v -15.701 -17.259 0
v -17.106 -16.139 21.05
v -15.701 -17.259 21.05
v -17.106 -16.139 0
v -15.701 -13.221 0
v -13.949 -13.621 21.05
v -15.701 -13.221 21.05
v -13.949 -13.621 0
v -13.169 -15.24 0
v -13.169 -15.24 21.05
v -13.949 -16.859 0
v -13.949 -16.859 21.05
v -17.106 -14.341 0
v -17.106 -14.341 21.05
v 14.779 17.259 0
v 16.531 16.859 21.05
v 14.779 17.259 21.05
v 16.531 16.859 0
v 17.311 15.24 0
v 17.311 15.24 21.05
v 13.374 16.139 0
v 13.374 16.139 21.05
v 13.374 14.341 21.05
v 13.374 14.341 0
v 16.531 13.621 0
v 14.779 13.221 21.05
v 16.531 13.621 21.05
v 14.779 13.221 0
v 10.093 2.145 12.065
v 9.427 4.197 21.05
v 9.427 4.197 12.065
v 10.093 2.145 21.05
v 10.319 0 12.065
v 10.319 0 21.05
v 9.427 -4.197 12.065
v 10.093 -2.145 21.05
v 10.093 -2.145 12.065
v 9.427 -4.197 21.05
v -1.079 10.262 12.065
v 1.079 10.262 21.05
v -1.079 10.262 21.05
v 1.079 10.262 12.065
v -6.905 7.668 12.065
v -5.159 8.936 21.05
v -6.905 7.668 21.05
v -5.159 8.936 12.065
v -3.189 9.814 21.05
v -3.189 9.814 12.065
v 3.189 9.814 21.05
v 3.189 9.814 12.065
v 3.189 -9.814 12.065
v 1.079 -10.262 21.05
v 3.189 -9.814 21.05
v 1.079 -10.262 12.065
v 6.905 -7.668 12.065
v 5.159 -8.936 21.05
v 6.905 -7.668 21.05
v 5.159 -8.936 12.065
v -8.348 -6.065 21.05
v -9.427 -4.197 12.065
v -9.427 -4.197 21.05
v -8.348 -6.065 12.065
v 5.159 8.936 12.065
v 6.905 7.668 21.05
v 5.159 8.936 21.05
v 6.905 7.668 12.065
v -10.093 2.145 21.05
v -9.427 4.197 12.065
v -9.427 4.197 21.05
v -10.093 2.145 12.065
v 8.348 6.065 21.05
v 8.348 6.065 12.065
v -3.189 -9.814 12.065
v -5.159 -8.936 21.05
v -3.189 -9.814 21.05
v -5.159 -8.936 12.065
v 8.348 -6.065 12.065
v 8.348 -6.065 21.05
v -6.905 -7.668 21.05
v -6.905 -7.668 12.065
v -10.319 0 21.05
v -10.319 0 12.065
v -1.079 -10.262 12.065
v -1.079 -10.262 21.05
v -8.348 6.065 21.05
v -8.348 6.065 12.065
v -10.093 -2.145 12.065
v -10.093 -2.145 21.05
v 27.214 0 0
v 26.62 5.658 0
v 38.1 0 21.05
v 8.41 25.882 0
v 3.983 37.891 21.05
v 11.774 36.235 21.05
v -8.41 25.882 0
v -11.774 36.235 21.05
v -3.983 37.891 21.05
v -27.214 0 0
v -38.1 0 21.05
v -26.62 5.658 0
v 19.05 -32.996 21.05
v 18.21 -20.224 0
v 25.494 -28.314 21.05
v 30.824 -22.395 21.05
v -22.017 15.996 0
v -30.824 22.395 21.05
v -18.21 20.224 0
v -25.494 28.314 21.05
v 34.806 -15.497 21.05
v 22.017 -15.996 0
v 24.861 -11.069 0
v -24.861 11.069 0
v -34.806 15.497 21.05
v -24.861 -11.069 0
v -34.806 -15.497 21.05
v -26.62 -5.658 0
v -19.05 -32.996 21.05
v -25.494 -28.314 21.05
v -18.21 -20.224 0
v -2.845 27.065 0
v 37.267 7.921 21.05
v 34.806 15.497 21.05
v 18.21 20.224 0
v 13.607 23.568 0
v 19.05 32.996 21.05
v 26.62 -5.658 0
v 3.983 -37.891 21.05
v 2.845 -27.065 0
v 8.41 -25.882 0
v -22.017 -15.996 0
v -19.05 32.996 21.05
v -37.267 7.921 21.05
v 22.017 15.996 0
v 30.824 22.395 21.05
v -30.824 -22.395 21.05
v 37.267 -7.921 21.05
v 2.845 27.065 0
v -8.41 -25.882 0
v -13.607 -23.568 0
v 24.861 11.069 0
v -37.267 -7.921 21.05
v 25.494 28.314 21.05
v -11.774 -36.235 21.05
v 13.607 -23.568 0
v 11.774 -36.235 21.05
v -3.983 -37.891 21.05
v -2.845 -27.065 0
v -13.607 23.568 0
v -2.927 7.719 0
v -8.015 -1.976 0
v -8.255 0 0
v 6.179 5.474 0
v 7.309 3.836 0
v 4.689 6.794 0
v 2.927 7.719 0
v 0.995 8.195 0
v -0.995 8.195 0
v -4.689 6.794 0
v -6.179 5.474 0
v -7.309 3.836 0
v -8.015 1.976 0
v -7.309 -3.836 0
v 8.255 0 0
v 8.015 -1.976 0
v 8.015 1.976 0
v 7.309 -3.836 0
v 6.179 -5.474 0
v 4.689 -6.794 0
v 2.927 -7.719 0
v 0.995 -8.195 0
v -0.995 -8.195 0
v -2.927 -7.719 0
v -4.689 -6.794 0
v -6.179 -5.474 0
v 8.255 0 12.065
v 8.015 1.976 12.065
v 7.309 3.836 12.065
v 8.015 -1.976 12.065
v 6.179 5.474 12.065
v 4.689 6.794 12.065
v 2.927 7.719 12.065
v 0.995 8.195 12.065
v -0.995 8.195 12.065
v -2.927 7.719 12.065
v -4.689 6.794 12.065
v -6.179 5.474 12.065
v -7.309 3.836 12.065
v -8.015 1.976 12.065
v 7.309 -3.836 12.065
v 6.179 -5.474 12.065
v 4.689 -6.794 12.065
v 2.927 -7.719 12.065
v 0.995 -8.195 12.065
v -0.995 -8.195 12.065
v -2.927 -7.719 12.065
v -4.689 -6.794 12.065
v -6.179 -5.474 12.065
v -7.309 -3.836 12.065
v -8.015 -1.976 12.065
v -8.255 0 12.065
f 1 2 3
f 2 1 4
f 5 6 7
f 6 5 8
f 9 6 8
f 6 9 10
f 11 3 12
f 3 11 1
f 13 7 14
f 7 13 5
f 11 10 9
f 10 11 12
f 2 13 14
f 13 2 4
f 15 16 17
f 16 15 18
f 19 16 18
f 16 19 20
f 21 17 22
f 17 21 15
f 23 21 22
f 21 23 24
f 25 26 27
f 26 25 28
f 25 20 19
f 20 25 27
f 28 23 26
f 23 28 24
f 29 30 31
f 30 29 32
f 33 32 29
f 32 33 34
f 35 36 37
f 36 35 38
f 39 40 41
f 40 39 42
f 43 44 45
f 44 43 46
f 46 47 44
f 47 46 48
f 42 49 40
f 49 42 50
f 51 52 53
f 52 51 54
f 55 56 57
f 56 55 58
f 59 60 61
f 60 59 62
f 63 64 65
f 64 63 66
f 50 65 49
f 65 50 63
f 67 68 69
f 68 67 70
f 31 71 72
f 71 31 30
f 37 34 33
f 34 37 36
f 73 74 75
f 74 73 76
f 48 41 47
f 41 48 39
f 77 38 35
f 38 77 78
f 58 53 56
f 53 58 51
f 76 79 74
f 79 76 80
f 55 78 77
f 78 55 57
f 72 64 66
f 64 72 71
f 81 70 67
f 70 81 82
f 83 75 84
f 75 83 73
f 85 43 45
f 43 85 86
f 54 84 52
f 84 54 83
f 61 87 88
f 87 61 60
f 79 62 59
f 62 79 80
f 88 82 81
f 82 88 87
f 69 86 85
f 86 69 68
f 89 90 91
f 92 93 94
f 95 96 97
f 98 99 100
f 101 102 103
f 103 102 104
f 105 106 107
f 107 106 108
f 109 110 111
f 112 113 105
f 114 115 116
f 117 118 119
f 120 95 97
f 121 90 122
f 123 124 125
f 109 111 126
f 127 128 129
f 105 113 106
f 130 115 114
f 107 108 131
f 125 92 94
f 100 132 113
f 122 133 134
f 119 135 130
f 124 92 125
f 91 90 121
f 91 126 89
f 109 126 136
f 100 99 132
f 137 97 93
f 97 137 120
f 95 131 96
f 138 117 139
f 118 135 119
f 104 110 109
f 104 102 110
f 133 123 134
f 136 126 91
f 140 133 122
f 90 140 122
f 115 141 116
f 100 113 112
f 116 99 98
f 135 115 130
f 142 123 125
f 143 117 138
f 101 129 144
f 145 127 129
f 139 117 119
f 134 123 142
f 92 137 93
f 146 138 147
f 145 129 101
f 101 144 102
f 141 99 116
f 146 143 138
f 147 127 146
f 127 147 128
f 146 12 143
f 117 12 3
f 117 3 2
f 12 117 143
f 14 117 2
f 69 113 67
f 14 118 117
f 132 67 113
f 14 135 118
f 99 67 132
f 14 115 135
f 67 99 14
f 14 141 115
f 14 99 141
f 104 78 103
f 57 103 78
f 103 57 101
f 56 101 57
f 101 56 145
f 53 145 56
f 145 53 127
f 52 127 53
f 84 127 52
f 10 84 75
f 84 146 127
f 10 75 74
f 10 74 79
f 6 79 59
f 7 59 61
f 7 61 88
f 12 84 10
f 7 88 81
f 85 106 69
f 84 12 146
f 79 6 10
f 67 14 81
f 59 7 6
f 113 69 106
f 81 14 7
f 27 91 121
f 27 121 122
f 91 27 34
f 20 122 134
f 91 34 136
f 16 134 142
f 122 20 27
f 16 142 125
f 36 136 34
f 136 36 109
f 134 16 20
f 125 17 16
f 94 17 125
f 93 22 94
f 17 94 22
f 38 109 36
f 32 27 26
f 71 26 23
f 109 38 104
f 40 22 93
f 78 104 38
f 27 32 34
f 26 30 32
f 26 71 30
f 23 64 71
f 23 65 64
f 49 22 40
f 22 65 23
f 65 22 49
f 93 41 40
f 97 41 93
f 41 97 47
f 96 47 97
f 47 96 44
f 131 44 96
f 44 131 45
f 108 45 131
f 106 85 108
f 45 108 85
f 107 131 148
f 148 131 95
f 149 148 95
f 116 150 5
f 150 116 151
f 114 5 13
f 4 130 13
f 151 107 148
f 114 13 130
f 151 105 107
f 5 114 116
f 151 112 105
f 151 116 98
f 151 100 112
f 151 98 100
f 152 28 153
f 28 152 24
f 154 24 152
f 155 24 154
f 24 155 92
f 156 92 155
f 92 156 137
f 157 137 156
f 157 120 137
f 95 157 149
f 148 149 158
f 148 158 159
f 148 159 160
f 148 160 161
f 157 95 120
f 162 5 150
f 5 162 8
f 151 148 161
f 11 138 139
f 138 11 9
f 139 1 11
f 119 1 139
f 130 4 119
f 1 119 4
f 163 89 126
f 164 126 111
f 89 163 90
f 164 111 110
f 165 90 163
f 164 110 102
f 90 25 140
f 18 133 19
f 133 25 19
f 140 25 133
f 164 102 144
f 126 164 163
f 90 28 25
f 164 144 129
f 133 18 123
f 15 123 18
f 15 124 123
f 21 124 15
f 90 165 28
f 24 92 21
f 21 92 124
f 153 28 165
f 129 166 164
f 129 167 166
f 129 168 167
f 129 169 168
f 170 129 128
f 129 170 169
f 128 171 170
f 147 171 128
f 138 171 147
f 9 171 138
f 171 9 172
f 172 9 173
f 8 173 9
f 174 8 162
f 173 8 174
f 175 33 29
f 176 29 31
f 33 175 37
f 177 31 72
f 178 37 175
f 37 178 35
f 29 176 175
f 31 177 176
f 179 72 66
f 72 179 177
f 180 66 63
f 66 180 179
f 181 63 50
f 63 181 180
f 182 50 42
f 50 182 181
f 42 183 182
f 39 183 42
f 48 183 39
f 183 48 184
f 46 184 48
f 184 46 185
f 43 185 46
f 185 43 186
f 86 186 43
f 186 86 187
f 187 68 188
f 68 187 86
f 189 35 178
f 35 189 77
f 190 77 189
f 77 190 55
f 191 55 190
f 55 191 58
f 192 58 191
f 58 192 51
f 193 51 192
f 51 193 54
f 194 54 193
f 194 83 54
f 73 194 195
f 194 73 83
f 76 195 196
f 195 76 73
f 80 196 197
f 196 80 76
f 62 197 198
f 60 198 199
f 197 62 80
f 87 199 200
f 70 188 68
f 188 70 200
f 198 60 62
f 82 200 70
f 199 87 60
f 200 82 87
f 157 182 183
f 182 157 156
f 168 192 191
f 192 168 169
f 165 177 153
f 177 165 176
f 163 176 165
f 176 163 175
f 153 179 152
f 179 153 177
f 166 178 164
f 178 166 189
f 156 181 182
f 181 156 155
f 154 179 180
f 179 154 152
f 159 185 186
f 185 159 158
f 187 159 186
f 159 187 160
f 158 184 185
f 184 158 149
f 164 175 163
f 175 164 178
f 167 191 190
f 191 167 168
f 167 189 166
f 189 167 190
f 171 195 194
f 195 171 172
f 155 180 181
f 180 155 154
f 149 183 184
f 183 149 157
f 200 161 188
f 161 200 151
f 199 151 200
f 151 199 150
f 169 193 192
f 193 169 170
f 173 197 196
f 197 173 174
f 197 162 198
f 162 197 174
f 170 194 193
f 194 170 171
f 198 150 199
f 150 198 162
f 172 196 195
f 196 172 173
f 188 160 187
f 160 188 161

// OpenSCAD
function mm(i) = i*25.4; 
    tubediam = mm(1.5); //diameter of the cardboard tube at the center
	 thickness= mm(.75); // thickness of material
	 boltwidth = mm(.1631); // desired diameter of bolt holes
	 bearingdiam = mm(.8125);
	 bearingheight = mm(.275);



module tubehold(tubediam=mm(3),thickness=mm(.75), boltwidth=mm(.1631),bearingdiam=mm(.8125), bearingheight = mm(.275))
    {
		union()
		{	
			difference()
			{	
			cylinder(thickness+2, (tubediam-(tubediam/(3.5)))/2, tubediam/2, 0);
				union()
					{				
					translate([-tubediam/5, -tubediam/5, -1])
						{
							cylinder(thickness+4, boltwidth/2, boltwidth/2, 0);
						}
					
					translate([tubediam/5, tubediam/5, -1])
						{
							cylinder(thickness+4, boltwidth/2, boltwidth/2, 0);
						}
					translate([0, 0, -1])
						{
							cylinder(thickness+4, bearingdiam/2, bearingdiam/2, 0);
						}
					}
				}
			difference()
				{	
					cylinder(thickness-bearingheight, bearingdiam/2, bearingdiam/2, 0);	
				translate([0, 0, -1])
					{
						cylinder(thickness-bearingheight+4, bearingdiam/2.5, bearingdiam/2.5, 0);
					}	
			}
		}
	 }

tubehold();
